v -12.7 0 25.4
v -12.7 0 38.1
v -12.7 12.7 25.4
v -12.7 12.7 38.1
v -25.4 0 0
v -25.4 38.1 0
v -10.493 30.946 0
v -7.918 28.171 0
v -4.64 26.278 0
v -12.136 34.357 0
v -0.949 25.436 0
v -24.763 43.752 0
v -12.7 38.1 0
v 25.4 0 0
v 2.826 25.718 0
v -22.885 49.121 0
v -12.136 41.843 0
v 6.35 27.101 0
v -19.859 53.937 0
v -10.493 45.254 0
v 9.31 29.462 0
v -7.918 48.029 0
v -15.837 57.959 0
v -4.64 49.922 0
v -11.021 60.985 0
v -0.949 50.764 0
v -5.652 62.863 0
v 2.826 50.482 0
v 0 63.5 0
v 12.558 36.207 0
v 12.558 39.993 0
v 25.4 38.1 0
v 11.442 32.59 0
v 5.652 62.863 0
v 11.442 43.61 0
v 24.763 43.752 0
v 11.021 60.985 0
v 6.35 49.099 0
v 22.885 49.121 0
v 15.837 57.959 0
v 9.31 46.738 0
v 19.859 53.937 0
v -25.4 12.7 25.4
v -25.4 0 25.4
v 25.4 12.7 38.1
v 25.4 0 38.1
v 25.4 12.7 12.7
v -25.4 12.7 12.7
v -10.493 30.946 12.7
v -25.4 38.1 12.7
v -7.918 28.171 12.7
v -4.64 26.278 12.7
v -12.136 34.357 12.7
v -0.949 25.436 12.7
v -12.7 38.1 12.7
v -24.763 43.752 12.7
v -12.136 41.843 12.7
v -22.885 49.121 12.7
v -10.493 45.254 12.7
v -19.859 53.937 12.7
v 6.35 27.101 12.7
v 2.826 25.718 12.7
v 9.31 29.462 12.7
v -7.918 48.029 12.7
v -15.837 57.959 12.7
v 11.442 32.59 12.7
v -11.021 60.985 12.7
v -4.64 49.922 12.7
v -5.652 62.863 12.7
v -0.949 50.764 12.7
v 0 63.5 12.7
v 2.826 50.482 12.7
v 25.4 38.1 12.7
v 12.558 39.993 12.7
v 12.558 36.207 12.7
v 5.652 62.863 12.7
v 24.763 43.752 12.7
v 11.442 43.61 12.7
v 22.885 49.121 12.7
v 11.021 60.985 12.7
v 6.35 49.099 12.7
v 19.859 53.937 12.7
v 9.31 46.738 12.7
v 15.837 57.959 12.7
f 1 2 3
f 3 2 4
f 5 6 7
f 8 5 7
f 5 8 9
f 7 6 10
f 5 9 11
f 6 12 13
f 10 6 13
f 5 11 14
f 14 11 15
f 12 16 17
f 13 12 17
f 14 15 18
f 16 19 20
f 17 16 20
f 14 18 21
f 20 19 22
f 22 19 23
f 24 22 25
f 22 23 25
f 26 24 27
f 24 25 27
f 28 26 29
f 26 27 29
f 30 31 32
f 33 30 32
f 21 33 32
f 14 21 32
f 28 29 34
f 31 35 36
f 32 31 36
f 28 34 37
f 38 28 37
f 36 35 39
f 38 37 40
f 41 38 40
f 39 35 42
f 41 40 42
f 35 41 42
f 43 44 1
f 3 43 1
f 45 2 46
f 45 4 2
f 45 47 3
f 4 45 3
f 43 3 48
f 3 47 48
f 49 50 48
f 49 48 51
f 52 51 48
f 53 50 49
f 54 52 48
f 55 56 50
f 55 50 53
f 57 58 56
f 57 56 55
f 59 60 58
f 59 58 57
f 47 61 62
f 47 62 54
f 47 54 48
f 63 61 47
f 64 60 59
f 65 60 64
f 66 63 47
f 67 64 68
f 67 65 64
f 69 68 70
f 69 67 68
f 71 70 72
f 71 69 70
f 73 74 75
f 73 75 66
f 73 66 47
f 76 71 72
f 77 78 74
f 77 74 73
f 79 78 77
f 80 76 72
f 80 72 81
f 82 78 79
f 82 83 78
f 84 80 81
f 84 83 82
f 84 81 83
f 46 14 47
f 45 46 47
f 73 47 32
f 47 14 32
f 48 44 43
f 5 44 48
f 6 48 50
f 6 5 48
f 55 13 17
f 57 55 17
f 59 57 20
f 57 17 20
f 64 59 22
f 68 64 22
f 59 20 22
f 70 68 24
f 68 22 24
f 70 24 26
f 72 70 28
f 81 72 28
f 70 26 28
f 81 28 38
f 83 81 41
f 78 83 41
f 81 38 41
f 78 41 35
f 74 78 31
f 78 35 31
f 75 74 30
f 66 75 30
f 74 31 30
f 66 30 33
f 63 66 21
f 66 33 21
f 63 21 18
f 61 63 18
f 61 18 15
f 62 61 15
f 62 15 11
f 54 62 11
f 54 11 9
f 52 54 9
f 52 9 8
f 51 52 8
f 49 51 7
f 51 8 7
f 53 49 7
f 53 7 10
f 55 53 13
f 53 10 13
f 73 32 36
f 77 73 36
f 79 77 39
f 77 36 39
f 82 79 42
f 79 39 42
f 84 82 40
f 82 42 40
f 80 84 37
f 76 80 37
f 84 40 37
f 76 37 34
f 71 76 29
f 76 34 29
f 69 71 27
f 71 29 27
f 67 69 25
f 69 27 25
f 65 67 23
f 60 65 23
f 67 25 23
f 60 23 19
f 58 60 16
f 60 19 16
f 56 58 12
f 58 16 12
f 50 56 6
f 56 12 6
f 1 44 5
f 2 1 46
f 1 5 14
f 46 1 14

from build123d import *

# Parameters (mm, degrees)
F1_DEPTH = 12.7
F2_W     = 38.1
F2_H     = 12.7
F2_W_2   = 12.7
F3_DEPTH = 25.4
F4_W     = 12.7
F4_H     = 12.7
F5_DEPTH = 12.7


with BuildPart() as f1:
    # F0 (on Top) → F1 (new body)
    with BuildSketch(Plane.XY):
        with BuildLine():
            Line((-25.4, 38.1), (-25.4, 0))
            Line((-25.4, 0), (25.4, 0))
            Line((25.4, 0), (25.4, 38.1))
            Line((25.4, 38.1), (12.7, 38.1))
            ThreePointArc((12.7, 38.1), (0, 25.4), (-12.7, 38.1))
            Line((-12.7, 38.1), (-25.4, 38.1))
        make_face()
        with BuildLine():
            ThreePointArc((25.4, 38.1), (0, 63.5), (-25.4, 38.1))
            Line((-25.4, 38.1), (-12.7, 38.1))
            ThreePointArc((-12.7, 38.1), (0, 50.8), (12.7, 38.1))
            Line((12.7, 38.1), (25.4, 38.1))
        make_face()
    extrude(amount=F1_DEPTH)

    # F2 (on face) → F3 (join)
    with BuildSketch(Plane.XY.offset(12.7)):
        with Locations((6.35, 6.35)):
            Rectangle(F2_W, F2_H)
        with Locations((-19.05, 6.35)):
            Rectangle(F2_W_2, F2_H)
    extrude(amount=F3_DEPTH)

    # F4 (on face) → F5 (cut)
    with BuildSketch(Plane.XY.offset(38.1)):
        with Locations((-19.05, 6.35)):
            Rectangle(F4_W, F4_H)
    extrude(amount=-F5_DEPTH, mode=Mode.SUBTRACT)


solid = f1.part
